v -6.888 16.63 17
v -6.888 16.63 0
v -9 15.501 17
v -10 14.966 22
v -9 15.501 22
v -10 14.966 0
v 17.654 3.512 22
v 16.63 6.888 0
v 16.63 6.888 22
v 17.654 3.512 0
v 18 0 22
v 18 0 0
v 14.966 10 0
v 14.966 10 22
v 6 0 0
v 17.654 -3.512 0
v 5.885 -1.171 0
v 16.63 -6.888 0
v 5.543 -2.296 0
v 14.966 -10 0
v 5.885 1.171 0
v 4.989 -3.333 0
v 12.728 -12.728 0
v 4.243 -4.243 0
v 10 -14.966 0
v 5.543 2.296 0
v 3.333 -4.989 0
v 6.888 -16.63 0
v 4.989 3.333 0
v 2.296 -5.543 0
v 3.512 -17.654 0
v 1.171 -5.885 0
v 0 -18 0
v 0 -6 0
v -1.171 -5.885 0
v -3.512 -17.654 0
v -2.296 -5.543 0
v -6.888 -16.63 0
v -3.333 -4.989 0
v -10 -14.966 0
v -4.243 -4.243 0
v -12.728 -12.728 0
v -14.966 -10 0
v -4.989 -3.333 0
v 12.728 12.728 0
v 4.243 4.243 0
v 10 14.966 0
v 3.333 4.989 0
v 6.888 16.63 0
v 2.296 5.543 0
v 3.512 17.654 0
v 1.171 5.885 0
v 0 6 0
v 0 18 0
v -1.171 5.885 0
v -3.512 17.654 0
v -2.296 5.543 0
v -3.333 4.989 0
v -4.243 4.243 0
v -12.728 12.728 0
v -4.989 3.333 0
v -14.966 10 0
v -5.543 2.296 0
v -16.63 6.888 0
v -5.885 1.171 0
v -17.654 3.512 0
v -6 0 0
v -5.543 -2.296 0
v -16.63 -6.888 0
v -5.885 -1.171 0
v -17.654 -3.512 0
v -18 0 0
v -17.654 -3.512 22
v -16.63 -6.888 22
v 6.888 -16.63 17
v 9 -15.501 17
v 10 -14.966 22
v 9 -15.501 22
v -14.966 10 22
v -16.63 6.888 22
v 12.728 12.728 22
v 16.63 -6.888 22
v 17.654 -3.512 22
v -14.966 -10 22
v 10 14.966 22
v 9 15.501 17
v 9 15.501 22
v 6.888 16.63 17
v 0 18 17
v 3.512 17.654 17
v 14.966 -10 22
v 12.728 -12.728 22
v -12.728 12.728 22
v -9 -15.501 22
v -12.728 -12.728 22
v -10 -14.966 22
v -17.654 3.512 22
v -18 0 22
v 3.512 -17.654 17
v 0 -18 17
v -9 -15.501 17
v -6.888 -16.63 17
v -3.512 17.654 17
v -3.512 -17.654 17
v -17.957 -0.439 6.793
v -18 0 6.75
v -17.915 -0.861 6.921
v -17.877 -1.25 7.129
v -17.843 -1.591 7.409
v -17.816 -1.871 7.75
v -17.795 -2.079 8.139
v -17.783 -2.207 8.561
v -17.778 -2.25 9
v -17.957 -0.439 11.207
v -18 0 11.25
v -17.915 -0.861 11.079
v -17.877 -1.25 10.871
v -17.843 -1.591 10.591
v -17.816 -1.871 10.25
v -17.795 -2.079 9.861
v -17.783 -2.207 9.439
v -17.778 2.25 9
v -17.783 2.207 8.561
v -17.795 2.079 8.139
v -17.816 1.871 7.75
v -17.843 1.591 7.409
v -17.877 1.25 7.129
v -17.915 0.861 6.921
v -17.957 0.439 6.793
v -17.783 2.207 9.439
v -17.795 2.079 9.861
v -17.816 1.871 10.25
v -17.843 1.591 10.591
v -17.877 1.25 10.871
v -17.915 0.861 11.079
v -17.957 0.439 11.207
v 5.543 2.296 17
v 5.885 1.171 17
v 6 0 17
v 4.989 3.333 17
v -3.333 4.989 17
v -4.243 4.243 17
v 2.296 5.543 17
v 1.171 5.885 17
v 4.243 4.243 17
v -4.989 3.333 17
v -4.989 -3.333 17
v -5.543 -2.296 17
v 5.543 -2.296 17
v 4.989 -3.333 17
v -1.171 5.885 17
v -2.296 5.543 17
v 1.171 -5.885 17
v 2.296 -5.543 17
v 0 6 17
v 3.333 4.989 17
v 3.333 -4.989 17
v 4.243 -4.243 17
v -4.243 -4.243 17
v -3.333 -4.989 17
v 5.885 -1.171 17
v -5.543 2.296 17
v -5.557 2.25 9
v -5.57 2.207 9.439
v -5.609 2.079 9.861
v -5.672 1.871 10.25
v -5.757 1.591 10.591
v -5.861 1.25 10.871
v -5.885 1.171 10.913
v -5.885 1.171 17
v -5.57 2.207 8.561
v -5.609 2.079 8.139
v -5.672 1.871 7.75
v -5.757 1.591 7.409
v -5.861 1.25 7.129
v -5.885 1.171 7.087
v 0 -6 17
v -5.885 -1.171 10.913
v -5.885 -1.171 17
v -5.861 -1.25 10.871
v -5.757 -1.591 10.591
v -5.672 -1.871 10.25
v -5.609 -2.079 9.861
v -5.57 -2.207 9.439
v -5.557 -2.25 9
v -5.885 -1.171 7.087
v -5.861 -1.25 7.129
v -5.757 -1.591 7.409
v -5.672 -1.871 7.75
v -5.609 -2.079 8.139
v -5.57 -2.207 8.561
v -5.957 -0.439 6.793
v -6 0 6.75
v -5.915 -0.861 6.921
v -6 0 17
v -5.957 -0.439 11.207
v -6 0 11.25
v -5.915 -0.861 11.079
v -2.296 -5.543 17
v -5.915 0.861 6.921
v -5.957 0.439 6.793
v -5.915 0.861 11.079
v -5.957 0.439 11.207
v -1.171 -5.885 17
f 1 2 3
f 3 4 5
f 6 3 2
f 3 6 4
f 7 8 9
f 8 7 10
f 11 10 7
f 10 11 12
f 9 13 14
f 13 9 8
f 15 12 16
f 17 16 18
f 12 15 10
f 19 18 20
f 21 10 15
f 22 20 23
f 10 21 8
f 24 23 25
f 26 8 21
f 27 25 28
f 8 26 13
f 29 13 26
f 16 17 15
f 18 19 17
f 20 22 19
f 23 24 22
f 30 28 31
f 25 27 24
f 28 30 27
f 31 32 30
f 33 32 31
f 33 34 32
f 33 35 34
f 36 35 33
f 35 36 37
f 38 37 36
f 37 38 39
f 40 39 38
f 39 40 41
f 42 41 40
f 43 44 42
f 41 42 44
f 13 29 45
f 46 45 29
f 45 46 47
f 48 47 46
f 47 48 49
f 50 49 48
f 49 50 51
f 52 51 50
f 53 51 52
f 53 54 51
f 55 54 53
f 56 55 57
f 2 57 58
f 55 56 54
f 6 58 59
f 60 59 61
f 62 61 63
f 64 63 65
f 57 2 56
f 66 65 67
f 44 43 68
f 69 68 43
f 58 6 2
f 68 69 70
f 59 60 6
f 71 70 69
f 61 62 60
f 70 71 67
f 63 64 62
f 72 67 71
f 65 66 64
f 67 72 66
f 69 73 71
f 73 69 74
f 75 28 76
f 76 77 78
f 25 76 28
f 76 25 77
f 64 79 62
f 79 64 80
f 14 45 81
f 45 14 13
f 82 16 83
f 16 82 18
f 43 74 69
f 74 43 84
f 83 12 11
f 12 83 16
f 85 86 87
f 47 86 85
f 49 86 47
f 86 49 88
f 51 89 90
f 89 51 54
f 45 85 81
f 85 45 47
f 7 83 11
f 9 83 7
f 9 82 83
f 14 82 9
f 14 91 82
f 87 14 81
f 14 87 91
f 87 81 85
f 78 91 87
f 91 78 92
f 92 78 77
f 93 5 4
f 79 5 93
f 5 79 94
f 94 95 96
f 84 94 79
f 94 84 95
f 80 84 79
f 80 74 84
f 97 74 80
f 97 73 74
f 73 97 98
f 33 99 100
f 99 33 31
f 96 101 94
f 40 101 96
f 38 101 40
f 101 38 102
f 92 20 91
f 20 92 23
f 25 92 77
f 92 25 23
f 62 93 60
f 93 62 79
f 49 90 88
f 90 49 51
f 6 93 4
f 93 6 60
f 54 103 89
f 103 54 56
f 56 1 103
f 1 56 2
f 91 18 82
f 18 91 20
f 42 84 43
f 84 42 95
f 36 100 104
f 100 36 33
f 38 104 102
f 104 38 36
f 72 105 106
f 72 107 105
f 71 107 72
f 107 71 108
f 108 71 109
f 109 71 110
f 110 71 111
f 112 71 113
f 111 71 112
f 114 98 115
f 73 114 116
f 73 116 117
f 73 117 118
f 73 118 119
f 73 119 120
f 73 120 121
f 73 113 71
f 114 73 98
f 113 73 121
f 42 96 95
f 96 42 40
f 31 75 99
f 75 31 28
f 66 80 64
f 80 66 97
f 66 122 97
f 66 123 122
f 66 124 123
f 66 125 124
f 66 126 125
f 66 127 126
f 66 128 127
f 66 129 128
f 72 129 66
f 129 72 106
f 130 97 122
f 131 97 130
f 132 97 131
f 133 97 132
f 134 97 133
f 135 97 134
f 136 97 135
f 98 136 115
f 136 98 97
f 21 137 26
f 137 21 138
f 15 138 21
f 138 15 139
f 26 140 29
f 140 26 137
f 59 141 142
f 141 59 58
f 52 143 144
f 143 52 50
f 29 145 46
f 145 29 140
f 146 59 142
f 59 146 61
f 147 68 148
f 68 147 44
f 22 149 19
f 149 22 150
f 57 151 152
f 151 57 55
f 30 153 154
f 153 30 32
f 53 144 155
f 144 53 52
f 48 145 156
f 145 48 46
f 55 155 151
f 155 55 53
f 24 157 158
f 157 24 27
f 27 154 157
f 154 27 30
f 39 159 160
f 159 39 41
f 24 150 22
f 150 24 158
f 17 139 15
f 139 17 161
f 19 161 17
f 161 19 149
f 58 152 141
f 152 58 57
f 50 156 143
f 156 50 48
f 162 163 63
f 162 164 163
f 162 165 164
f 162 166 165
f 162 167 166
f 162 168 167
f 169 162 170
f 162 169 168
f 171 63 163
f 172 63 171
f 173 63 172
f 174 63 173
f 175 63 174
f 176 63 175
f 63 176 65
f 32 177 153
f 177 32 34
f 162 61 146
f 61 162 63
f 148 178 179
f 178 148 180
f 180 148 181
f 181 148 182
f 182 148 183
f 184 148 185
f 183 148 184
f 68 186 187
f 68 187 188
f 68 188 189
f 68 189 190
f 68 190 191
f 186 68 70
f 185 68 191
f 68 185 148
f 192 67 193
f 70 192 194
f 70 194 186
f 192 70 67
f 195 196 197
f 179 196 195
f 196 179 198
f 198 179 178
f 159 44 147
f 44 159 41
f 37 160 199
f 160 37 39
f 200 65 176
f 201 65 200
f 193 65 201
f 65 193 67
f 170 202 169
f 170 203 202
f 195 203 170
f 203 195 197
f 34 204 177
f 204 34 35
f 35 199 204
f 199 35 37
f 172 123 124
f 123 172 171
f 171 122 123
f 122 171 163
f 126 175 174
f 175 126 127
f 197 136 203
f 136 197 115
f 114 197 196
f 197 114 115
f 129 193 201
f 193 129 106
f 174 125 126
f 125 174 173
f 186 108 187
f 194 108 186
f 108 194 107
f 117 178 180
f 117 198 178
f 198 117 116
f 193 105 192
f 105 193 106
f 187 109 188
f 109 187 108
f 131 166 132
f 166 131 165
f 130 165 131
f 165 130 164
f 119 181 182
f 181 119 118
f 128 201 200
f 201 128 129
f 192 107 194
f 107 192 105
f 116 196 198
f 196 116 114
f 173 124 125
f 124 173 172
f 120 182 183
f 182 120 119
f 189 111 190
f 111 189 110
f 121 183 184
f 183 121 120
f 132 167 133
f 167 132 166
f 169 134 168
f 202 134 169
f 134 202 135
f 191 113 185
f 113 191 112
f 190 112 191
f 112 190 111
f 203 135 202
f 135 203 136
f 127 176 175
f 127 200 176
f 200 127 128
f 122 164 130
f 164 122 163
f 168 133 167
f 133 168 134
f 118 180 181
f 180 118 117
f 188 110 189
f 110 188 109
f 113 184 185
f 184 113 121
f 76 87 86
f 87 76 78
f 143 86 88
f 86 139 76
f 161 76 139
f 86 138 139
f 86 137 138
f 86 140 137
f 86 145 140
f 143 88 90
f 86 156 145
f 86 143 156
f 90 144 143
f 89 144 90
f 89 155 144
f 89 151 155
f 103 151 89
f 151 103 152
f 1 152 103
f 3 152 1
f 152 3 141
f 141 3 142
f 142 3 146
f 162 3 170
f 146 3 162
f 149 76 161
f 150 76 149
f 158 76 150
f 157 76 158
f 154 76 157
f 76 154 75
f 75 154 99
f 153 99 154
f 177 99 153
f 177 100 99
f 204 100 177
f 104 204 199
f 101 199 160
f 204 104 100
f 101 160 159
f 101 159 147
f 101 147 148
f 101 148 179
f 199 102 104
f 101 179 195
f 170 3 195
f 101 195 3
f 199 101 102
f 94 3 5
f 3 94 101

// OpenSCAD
$fn = 32;

// ----------------------------------------------------------------------
// Oldham coupling hub: 36 x 22 mm
// ----------------------------------------------------------------------

// --- parameters (mm) ---
hub_d = 36;               // hub diameter
hub_l = 18;               // hub length
bore_d = 12;              // shaft bore
tongue_w = 18;            // drive tongue width
tongue_h = 4;             // drive tongue height
set_d = 4.5;              // set screw tap hole

module hub() {
  /* the slot side is a raised disc with a groove milled across it */
  cylinder(h = hub_l + tongue_h, d = hub_d);
}

difference() {
  hub();
  translate([0, 0, -1]) cylinder(h = hub_l + tongue_h + 2, d = bore_d);
  translate([-hub_d / 2 - 1, 0, hub_l * 0.5])
    rotate([0, 90, 0]) cylinder(h = hub_d / 2 + 2, d = set_d);
  translate([-tongue_w / 2, -hub_d / 2 - 1, hub_l - 1])
    cube([tongue_w, hub_d + 2, tongue_h + 1]);
}
